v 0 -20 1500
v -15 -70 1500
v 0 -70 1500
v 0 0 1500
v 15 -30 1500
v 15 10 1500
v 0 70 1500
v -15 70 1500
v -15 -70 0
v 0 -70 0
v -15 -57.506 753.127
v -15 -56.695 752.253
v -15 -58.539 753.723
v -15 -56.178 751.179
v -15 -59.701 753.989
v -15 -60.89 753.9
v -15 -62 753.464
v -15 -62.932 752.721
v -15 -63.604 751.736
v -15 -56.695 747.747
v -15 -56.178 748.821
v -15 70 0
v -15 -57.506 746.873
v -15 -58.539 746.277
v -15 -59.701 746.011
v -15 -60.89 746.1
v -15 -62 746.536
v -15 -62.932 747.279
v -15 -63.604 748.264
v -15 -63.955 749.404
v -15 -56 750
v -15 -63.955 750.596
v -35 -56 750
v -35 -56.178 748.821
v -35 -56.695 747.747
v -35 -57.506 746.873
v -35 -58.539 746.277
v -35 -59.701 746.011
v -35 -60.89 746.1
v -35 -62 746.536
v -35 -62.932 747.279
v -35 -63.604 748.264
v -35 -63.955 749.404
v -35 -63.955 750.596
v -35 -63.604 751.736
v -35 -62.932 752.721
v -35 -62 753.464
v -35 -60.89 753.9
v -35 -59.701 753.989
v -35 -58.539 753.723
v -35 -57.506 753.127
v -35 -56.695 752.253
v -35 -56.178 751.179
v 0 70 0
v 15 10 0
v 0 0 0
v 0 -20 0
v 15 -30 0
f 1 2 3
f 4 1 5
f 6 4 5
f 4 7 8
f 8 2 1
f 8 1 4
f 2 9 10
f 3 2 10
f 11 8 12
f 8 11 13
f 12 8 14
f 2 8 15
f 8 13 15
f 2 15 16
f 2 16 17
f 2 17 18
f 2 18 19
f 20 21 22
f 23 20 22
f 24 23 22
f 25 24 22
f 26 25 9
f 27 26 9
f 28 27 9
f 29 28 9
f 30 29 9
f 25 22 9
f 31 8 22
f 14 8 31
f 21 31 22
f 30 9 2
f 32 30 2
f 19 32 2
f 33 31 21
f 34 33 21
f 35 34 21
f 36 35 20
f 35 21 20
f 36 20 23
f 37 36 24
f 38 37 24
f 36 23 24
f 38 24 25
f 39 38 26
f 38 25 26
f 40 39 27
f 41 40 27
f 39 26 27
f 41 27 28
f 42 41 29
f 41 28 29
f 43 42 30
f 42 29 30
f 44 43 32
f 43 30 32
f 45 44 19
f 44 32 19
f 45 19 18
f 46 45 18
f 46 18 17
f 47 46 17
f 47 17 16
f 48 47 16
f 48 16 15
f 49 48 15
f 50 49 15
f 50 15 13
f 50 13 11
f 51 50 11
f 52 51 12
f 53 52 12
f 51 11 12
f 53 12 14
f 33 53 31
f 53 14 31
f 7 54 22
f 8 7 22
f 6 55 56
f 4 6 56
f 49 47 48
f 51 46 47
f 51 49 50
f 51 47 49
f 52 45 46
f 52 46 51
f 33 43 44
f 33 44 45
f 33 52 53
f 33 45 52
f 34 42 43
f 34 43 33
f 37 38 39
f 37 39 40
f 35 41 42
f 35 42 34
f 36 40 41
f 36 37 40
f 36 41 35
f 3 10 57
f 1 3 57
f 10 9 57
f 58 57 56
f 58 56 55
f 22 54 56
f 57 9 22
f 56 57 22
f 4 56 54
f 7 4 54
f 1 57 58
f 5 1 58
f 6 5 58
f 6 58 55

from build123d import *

# Parameters (mm, degrees)
BOSS_EXTRUDE1_DEPTH = 1500
SKETCH3_R           = 4
BOSS_EXTRUDE2_DEPTH = 20


with BuildPart() as part:
    # Sketch2 → Boss-Extrude1 (new body)
    with BuildSketch(Plane.XY):
        Polygon((0, -70), (0, -20), (15, -30), (15, 10), (0, 0), (0, 70), (-15, 70), (-15, -70), align=None)
    extrude(amount=BOSS_EXTRUDE1_DEPTH)

    # Sketch3 → Boss-Extrude2 (add)
    with BuildSketch(Plane.ZY.offset(15)):
        with Locations(Location((750, -60, 0), (0, 0, 90))):
            Circle(SKETCH3_R)
    extrude(amount=BOSS_EXTRUDE2_DEPTH)


solid = part.part
